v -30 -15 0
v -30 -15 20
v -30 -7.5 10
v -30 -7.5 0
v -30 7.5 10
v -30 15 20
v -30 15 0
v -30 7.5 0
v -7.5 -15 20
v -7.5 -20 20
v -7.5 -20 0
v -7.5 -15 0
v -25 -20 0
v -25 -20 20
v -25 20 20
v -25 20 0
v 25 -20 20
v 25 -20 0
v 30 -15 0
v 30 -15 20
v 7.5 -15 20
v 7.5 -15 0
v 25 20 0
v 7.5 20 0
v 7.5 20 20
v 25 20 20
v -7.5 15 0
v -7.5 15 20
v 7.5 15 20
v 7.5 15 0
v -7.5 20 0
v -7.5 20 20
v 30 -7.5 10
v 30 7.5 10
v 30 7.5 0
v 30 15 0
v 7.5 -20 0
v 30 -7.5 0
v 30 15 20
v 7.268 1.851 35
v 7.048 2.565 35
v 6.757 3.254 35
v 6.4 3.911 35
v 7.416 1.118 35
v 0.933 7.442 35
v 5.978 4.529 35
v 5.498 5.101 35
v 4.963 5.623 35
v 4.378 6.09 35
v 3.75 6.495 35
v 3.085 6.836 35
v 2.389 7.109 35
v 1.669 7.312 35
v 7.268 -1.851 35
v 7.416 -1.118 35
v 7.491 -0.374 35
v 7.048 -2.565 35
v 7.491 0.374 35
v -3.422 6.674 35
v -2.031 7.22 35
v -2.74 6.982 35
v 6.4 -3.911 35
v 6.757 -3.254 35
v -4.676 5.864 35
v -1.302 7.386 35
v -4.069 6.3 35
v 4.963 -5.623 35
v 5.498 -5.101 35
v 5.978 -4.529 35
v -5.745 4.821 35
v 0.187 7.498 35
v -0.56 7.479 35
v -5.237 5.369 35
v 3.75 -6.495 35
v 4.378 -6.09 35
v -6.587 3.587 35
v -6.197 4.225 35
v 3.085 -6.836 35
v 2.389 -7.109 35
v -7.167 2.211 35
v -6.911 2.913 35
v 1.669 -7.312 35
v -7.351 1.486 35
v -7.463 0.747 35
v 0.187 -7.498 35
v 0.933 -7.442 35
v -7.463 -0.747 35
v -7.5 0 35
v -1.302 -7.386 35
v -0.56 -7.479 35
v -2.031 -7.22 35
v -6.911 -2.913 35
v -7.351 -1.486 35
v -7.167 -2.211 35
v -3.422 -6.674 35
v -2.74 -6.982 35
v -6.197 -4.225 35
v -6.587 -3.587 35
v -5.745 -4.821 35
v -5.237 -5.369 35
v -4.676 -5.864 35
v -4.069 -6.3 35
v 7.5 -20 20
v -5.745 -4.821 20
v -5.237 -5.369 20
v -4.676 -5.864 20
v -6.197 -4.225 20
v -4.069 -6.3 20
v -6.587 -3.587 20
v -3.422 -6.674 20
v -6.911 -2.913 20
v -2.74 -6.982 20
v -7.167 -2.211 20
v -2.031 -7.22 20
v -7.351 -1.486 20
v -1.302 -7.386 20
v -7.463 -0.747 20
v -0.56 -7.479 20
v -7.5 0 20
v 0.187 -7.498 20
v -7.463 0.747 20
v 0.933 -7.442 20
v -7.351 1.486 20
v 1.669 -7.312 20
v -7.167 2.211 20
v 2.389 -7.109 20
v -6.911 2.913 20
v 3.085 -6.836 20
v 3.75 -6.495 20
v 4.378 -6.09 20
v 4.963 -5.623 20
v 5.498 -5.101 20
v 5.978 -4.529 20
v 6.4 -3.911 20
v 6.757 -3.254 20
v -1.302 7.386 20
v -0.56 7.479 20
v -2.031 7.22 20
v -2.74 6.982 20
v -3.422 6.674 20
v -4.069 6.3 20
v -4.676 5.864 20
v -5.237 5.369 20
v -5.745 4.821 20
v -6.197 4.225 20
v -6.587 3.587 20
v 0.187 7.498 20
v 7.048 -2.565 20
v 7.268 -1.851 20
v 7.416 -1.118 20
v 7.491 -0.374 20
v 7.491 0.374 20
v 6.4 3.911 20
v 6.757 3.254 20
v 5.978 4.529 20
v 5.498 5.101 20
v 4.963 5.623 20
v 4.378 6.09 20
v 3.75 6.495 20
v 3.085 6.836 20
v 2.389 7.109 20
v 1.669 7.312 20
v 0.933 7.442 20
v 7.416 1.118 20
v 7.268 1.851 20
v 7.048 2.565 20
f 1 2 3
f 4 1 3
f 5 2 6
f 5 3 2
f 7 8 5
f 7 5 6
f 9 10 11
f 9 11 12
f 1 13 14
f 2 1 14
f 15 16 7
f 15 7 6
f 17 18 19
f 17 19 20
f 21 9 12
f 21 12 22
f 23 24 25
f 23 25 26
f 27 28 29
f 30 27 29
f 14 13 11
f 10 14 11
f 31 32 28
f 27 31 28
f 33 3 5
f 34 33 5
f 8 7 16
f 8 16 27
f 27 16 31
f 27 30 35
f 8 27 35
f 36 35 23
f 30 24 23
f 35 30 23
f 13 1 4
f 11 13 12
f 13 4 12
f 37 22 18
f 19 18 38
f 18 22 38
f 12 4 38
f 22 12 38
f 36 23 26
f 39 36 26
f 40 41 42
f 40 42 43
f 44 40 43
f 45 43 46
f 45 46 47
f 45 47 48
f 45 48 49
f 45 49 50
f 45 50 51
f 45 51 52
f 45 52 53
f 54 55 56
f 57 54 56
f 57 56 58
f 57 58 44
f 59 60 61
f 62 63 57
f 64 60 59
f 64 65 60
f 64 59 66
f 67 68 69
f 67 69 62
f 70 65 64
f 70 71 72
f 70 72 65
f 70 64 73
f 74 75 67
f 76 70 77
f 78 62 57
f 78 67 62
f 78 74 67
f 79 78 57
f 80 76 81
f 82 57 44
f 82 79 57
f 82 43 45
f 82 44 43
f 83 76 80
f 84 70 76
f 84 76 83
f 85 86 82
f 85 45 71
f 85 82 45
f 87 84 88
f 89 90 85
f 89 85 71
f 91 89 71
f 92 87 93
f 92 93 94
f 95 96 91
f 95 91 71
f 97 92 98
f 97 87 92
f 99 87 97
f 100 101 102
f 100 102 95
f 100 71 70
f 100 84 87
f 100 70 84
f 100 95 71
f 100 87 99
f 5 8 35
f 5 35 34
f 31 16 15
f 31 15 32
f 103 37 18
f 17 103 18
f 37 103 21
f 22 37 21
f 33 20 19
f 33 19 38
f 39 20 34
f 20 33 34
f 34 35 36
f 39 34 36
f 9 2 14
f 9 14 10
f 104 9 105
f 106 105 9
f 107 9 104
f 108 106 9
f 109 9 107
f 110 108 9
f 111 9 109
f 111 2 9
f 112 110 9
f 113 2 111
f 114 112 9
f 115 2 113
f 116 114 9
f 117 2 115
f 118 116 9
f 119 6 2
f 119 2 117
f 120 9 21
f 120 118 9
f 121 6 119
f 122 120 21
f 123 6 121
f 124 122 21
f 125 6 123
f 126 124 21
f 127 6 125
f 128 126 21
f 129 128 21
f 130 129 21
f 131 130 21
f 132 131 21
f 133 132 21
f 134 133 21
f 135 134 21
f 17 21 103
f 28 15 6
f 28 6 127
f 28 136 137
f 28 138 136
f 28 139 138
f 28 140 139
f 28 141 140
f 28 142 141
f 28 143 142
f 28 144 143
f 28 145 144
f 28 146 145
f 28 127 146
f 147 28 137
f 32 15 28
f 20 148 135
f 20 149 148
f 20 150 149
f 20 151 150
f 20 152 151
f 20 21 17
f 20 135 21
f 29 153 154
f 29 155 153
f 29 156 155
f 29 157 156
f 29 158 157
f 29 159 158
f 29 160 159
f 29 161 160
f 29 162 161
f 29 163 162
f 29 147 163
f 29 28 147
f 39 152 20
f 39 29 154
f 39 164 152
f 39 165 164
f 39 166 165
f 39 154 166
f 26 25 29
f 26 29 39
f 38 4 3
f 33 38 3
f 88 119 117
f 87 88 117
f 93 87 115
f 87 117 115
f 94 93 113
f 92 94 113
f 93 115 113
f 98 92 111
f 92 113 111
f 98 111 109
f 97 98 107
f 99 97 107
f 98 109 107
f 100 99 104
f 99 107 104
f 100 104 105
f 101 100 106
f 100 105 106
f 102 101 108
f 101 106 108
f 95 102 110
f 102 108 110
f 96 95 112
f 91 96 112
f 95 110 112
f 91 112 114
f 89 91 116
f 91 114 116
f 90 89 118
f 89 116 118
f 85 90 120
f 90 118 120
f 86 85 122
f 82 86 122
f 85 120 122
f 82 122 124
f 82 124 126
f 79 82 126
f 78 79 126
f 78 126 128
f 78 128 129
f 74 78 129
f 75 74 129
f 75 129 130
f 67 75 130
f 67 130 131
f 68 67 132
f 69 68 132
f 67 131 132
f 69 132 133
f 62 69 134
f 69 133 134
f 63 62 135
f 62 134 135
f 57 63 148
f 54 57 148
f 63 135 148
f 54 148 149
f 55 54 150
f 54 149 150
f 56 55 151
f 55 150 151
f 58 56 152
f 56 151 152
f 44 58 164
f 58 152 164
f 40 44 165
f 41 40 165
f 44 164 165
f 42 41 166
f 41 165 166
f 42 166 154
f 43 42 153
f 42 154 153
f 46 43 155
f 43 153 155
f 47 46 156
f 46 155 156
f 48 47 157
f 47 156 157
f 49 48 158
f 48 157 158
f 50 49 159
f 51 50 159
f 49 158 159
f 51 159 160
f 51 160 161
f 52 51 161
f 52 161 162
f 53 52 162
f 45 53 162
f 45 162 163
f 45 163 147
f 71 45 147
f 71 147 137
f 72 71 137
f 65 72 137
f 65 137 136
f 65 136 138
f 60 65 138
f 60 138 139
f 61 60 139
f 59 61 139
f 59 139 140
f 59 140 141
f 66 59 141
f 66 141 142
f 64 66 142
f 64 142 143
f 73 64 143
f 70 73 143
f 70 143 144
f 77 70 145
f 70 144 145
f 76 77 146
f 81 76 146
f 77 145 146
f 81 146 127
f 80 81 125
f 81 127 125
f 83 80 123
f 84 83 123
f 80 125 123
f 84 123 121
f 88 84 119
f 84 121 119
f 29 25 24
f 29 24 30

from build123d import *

# Parameters (mm, degrees)
SKETCH_1_W          = 60
SKETCH_1_H          = 40
EXTRUDE_1_DEPTH     = 20
SKETCH_2_R          = 7.5
EXTRUDE_2_DEPTH     = 15
SKETCH_3_W          = 15
SKETCH_3_H          = 5
CUT_EXTRUDE_1_DEPTH = 42.231056256
SKETCH_4_W          = 10
SKETCH_4_H          = 15
CUT_EXTRUDE_2_DEPTH = 73.284161474
CHAMFER_1_SIZE      = 5


with BuildPart() as part:
    # Эскиз1 → Бобышка-Вытянуть1 (new body)
    with BuildSketch(Plane.XY):
        Rectangle(SKETCH_1_W, SKETCH_1_H)
    extrude(amount=EXTRUDE_1_DEPTH)

    # Эскиз2 → Бобышка-Вытянуть2 (add)
    with BuildSketch(Plane.XY.offset(20)):
        with Locations(Location((0, 0, 0), (0, 0, 180))):
            Circle(SKETCH_2_R)
    extrude(amount=EXTRUDE_2_DEPTH)

    # Эскиз3 → Вырез-Вытянуть1 (cut, through all)
    with BuildSketch(Plane.XY.offset(20)):
        with Locations((0, -17.5)):
            Rectangle(SKETCH_3_W, SKETCH_3_H)
    cut_extrude_1 = extrude(amount=-CUT_EXTRUDE_1_DEPTH, mode=Mode.SUBTRACT)

    # Зеркальное отражение1: Вырез-Вытянуть1 across plane
    add(cut_extrude_1.mirror(Plane.ZX), mode=Mode.SUBTRACT)

    # Эскиз4 → Вырез-Вытянуть2 (cut, through all)
    with BuildSketch(Plane.ZY.offset(30)):
        with Locations((5, 0)):
            Rectangle(SKETCH_4_W, SKETCH_4_H)
    extrude(amount=-CUT_EXTRUDE_2_DEPTH, mode=Mode.SUBTRACT)

    # Фаска1
    chamfer_1_edges = [part.edges().sort_by_distance(p)[0] for p in [
        (30, -20, 10),
        (-30, -20, 10),
        (-30, 20, 10),
        (30, 20, 10),
    ]]
    chamfer(chamfer_1_edges, length=CHAMFER_1_SIZE)


solid = part.part
